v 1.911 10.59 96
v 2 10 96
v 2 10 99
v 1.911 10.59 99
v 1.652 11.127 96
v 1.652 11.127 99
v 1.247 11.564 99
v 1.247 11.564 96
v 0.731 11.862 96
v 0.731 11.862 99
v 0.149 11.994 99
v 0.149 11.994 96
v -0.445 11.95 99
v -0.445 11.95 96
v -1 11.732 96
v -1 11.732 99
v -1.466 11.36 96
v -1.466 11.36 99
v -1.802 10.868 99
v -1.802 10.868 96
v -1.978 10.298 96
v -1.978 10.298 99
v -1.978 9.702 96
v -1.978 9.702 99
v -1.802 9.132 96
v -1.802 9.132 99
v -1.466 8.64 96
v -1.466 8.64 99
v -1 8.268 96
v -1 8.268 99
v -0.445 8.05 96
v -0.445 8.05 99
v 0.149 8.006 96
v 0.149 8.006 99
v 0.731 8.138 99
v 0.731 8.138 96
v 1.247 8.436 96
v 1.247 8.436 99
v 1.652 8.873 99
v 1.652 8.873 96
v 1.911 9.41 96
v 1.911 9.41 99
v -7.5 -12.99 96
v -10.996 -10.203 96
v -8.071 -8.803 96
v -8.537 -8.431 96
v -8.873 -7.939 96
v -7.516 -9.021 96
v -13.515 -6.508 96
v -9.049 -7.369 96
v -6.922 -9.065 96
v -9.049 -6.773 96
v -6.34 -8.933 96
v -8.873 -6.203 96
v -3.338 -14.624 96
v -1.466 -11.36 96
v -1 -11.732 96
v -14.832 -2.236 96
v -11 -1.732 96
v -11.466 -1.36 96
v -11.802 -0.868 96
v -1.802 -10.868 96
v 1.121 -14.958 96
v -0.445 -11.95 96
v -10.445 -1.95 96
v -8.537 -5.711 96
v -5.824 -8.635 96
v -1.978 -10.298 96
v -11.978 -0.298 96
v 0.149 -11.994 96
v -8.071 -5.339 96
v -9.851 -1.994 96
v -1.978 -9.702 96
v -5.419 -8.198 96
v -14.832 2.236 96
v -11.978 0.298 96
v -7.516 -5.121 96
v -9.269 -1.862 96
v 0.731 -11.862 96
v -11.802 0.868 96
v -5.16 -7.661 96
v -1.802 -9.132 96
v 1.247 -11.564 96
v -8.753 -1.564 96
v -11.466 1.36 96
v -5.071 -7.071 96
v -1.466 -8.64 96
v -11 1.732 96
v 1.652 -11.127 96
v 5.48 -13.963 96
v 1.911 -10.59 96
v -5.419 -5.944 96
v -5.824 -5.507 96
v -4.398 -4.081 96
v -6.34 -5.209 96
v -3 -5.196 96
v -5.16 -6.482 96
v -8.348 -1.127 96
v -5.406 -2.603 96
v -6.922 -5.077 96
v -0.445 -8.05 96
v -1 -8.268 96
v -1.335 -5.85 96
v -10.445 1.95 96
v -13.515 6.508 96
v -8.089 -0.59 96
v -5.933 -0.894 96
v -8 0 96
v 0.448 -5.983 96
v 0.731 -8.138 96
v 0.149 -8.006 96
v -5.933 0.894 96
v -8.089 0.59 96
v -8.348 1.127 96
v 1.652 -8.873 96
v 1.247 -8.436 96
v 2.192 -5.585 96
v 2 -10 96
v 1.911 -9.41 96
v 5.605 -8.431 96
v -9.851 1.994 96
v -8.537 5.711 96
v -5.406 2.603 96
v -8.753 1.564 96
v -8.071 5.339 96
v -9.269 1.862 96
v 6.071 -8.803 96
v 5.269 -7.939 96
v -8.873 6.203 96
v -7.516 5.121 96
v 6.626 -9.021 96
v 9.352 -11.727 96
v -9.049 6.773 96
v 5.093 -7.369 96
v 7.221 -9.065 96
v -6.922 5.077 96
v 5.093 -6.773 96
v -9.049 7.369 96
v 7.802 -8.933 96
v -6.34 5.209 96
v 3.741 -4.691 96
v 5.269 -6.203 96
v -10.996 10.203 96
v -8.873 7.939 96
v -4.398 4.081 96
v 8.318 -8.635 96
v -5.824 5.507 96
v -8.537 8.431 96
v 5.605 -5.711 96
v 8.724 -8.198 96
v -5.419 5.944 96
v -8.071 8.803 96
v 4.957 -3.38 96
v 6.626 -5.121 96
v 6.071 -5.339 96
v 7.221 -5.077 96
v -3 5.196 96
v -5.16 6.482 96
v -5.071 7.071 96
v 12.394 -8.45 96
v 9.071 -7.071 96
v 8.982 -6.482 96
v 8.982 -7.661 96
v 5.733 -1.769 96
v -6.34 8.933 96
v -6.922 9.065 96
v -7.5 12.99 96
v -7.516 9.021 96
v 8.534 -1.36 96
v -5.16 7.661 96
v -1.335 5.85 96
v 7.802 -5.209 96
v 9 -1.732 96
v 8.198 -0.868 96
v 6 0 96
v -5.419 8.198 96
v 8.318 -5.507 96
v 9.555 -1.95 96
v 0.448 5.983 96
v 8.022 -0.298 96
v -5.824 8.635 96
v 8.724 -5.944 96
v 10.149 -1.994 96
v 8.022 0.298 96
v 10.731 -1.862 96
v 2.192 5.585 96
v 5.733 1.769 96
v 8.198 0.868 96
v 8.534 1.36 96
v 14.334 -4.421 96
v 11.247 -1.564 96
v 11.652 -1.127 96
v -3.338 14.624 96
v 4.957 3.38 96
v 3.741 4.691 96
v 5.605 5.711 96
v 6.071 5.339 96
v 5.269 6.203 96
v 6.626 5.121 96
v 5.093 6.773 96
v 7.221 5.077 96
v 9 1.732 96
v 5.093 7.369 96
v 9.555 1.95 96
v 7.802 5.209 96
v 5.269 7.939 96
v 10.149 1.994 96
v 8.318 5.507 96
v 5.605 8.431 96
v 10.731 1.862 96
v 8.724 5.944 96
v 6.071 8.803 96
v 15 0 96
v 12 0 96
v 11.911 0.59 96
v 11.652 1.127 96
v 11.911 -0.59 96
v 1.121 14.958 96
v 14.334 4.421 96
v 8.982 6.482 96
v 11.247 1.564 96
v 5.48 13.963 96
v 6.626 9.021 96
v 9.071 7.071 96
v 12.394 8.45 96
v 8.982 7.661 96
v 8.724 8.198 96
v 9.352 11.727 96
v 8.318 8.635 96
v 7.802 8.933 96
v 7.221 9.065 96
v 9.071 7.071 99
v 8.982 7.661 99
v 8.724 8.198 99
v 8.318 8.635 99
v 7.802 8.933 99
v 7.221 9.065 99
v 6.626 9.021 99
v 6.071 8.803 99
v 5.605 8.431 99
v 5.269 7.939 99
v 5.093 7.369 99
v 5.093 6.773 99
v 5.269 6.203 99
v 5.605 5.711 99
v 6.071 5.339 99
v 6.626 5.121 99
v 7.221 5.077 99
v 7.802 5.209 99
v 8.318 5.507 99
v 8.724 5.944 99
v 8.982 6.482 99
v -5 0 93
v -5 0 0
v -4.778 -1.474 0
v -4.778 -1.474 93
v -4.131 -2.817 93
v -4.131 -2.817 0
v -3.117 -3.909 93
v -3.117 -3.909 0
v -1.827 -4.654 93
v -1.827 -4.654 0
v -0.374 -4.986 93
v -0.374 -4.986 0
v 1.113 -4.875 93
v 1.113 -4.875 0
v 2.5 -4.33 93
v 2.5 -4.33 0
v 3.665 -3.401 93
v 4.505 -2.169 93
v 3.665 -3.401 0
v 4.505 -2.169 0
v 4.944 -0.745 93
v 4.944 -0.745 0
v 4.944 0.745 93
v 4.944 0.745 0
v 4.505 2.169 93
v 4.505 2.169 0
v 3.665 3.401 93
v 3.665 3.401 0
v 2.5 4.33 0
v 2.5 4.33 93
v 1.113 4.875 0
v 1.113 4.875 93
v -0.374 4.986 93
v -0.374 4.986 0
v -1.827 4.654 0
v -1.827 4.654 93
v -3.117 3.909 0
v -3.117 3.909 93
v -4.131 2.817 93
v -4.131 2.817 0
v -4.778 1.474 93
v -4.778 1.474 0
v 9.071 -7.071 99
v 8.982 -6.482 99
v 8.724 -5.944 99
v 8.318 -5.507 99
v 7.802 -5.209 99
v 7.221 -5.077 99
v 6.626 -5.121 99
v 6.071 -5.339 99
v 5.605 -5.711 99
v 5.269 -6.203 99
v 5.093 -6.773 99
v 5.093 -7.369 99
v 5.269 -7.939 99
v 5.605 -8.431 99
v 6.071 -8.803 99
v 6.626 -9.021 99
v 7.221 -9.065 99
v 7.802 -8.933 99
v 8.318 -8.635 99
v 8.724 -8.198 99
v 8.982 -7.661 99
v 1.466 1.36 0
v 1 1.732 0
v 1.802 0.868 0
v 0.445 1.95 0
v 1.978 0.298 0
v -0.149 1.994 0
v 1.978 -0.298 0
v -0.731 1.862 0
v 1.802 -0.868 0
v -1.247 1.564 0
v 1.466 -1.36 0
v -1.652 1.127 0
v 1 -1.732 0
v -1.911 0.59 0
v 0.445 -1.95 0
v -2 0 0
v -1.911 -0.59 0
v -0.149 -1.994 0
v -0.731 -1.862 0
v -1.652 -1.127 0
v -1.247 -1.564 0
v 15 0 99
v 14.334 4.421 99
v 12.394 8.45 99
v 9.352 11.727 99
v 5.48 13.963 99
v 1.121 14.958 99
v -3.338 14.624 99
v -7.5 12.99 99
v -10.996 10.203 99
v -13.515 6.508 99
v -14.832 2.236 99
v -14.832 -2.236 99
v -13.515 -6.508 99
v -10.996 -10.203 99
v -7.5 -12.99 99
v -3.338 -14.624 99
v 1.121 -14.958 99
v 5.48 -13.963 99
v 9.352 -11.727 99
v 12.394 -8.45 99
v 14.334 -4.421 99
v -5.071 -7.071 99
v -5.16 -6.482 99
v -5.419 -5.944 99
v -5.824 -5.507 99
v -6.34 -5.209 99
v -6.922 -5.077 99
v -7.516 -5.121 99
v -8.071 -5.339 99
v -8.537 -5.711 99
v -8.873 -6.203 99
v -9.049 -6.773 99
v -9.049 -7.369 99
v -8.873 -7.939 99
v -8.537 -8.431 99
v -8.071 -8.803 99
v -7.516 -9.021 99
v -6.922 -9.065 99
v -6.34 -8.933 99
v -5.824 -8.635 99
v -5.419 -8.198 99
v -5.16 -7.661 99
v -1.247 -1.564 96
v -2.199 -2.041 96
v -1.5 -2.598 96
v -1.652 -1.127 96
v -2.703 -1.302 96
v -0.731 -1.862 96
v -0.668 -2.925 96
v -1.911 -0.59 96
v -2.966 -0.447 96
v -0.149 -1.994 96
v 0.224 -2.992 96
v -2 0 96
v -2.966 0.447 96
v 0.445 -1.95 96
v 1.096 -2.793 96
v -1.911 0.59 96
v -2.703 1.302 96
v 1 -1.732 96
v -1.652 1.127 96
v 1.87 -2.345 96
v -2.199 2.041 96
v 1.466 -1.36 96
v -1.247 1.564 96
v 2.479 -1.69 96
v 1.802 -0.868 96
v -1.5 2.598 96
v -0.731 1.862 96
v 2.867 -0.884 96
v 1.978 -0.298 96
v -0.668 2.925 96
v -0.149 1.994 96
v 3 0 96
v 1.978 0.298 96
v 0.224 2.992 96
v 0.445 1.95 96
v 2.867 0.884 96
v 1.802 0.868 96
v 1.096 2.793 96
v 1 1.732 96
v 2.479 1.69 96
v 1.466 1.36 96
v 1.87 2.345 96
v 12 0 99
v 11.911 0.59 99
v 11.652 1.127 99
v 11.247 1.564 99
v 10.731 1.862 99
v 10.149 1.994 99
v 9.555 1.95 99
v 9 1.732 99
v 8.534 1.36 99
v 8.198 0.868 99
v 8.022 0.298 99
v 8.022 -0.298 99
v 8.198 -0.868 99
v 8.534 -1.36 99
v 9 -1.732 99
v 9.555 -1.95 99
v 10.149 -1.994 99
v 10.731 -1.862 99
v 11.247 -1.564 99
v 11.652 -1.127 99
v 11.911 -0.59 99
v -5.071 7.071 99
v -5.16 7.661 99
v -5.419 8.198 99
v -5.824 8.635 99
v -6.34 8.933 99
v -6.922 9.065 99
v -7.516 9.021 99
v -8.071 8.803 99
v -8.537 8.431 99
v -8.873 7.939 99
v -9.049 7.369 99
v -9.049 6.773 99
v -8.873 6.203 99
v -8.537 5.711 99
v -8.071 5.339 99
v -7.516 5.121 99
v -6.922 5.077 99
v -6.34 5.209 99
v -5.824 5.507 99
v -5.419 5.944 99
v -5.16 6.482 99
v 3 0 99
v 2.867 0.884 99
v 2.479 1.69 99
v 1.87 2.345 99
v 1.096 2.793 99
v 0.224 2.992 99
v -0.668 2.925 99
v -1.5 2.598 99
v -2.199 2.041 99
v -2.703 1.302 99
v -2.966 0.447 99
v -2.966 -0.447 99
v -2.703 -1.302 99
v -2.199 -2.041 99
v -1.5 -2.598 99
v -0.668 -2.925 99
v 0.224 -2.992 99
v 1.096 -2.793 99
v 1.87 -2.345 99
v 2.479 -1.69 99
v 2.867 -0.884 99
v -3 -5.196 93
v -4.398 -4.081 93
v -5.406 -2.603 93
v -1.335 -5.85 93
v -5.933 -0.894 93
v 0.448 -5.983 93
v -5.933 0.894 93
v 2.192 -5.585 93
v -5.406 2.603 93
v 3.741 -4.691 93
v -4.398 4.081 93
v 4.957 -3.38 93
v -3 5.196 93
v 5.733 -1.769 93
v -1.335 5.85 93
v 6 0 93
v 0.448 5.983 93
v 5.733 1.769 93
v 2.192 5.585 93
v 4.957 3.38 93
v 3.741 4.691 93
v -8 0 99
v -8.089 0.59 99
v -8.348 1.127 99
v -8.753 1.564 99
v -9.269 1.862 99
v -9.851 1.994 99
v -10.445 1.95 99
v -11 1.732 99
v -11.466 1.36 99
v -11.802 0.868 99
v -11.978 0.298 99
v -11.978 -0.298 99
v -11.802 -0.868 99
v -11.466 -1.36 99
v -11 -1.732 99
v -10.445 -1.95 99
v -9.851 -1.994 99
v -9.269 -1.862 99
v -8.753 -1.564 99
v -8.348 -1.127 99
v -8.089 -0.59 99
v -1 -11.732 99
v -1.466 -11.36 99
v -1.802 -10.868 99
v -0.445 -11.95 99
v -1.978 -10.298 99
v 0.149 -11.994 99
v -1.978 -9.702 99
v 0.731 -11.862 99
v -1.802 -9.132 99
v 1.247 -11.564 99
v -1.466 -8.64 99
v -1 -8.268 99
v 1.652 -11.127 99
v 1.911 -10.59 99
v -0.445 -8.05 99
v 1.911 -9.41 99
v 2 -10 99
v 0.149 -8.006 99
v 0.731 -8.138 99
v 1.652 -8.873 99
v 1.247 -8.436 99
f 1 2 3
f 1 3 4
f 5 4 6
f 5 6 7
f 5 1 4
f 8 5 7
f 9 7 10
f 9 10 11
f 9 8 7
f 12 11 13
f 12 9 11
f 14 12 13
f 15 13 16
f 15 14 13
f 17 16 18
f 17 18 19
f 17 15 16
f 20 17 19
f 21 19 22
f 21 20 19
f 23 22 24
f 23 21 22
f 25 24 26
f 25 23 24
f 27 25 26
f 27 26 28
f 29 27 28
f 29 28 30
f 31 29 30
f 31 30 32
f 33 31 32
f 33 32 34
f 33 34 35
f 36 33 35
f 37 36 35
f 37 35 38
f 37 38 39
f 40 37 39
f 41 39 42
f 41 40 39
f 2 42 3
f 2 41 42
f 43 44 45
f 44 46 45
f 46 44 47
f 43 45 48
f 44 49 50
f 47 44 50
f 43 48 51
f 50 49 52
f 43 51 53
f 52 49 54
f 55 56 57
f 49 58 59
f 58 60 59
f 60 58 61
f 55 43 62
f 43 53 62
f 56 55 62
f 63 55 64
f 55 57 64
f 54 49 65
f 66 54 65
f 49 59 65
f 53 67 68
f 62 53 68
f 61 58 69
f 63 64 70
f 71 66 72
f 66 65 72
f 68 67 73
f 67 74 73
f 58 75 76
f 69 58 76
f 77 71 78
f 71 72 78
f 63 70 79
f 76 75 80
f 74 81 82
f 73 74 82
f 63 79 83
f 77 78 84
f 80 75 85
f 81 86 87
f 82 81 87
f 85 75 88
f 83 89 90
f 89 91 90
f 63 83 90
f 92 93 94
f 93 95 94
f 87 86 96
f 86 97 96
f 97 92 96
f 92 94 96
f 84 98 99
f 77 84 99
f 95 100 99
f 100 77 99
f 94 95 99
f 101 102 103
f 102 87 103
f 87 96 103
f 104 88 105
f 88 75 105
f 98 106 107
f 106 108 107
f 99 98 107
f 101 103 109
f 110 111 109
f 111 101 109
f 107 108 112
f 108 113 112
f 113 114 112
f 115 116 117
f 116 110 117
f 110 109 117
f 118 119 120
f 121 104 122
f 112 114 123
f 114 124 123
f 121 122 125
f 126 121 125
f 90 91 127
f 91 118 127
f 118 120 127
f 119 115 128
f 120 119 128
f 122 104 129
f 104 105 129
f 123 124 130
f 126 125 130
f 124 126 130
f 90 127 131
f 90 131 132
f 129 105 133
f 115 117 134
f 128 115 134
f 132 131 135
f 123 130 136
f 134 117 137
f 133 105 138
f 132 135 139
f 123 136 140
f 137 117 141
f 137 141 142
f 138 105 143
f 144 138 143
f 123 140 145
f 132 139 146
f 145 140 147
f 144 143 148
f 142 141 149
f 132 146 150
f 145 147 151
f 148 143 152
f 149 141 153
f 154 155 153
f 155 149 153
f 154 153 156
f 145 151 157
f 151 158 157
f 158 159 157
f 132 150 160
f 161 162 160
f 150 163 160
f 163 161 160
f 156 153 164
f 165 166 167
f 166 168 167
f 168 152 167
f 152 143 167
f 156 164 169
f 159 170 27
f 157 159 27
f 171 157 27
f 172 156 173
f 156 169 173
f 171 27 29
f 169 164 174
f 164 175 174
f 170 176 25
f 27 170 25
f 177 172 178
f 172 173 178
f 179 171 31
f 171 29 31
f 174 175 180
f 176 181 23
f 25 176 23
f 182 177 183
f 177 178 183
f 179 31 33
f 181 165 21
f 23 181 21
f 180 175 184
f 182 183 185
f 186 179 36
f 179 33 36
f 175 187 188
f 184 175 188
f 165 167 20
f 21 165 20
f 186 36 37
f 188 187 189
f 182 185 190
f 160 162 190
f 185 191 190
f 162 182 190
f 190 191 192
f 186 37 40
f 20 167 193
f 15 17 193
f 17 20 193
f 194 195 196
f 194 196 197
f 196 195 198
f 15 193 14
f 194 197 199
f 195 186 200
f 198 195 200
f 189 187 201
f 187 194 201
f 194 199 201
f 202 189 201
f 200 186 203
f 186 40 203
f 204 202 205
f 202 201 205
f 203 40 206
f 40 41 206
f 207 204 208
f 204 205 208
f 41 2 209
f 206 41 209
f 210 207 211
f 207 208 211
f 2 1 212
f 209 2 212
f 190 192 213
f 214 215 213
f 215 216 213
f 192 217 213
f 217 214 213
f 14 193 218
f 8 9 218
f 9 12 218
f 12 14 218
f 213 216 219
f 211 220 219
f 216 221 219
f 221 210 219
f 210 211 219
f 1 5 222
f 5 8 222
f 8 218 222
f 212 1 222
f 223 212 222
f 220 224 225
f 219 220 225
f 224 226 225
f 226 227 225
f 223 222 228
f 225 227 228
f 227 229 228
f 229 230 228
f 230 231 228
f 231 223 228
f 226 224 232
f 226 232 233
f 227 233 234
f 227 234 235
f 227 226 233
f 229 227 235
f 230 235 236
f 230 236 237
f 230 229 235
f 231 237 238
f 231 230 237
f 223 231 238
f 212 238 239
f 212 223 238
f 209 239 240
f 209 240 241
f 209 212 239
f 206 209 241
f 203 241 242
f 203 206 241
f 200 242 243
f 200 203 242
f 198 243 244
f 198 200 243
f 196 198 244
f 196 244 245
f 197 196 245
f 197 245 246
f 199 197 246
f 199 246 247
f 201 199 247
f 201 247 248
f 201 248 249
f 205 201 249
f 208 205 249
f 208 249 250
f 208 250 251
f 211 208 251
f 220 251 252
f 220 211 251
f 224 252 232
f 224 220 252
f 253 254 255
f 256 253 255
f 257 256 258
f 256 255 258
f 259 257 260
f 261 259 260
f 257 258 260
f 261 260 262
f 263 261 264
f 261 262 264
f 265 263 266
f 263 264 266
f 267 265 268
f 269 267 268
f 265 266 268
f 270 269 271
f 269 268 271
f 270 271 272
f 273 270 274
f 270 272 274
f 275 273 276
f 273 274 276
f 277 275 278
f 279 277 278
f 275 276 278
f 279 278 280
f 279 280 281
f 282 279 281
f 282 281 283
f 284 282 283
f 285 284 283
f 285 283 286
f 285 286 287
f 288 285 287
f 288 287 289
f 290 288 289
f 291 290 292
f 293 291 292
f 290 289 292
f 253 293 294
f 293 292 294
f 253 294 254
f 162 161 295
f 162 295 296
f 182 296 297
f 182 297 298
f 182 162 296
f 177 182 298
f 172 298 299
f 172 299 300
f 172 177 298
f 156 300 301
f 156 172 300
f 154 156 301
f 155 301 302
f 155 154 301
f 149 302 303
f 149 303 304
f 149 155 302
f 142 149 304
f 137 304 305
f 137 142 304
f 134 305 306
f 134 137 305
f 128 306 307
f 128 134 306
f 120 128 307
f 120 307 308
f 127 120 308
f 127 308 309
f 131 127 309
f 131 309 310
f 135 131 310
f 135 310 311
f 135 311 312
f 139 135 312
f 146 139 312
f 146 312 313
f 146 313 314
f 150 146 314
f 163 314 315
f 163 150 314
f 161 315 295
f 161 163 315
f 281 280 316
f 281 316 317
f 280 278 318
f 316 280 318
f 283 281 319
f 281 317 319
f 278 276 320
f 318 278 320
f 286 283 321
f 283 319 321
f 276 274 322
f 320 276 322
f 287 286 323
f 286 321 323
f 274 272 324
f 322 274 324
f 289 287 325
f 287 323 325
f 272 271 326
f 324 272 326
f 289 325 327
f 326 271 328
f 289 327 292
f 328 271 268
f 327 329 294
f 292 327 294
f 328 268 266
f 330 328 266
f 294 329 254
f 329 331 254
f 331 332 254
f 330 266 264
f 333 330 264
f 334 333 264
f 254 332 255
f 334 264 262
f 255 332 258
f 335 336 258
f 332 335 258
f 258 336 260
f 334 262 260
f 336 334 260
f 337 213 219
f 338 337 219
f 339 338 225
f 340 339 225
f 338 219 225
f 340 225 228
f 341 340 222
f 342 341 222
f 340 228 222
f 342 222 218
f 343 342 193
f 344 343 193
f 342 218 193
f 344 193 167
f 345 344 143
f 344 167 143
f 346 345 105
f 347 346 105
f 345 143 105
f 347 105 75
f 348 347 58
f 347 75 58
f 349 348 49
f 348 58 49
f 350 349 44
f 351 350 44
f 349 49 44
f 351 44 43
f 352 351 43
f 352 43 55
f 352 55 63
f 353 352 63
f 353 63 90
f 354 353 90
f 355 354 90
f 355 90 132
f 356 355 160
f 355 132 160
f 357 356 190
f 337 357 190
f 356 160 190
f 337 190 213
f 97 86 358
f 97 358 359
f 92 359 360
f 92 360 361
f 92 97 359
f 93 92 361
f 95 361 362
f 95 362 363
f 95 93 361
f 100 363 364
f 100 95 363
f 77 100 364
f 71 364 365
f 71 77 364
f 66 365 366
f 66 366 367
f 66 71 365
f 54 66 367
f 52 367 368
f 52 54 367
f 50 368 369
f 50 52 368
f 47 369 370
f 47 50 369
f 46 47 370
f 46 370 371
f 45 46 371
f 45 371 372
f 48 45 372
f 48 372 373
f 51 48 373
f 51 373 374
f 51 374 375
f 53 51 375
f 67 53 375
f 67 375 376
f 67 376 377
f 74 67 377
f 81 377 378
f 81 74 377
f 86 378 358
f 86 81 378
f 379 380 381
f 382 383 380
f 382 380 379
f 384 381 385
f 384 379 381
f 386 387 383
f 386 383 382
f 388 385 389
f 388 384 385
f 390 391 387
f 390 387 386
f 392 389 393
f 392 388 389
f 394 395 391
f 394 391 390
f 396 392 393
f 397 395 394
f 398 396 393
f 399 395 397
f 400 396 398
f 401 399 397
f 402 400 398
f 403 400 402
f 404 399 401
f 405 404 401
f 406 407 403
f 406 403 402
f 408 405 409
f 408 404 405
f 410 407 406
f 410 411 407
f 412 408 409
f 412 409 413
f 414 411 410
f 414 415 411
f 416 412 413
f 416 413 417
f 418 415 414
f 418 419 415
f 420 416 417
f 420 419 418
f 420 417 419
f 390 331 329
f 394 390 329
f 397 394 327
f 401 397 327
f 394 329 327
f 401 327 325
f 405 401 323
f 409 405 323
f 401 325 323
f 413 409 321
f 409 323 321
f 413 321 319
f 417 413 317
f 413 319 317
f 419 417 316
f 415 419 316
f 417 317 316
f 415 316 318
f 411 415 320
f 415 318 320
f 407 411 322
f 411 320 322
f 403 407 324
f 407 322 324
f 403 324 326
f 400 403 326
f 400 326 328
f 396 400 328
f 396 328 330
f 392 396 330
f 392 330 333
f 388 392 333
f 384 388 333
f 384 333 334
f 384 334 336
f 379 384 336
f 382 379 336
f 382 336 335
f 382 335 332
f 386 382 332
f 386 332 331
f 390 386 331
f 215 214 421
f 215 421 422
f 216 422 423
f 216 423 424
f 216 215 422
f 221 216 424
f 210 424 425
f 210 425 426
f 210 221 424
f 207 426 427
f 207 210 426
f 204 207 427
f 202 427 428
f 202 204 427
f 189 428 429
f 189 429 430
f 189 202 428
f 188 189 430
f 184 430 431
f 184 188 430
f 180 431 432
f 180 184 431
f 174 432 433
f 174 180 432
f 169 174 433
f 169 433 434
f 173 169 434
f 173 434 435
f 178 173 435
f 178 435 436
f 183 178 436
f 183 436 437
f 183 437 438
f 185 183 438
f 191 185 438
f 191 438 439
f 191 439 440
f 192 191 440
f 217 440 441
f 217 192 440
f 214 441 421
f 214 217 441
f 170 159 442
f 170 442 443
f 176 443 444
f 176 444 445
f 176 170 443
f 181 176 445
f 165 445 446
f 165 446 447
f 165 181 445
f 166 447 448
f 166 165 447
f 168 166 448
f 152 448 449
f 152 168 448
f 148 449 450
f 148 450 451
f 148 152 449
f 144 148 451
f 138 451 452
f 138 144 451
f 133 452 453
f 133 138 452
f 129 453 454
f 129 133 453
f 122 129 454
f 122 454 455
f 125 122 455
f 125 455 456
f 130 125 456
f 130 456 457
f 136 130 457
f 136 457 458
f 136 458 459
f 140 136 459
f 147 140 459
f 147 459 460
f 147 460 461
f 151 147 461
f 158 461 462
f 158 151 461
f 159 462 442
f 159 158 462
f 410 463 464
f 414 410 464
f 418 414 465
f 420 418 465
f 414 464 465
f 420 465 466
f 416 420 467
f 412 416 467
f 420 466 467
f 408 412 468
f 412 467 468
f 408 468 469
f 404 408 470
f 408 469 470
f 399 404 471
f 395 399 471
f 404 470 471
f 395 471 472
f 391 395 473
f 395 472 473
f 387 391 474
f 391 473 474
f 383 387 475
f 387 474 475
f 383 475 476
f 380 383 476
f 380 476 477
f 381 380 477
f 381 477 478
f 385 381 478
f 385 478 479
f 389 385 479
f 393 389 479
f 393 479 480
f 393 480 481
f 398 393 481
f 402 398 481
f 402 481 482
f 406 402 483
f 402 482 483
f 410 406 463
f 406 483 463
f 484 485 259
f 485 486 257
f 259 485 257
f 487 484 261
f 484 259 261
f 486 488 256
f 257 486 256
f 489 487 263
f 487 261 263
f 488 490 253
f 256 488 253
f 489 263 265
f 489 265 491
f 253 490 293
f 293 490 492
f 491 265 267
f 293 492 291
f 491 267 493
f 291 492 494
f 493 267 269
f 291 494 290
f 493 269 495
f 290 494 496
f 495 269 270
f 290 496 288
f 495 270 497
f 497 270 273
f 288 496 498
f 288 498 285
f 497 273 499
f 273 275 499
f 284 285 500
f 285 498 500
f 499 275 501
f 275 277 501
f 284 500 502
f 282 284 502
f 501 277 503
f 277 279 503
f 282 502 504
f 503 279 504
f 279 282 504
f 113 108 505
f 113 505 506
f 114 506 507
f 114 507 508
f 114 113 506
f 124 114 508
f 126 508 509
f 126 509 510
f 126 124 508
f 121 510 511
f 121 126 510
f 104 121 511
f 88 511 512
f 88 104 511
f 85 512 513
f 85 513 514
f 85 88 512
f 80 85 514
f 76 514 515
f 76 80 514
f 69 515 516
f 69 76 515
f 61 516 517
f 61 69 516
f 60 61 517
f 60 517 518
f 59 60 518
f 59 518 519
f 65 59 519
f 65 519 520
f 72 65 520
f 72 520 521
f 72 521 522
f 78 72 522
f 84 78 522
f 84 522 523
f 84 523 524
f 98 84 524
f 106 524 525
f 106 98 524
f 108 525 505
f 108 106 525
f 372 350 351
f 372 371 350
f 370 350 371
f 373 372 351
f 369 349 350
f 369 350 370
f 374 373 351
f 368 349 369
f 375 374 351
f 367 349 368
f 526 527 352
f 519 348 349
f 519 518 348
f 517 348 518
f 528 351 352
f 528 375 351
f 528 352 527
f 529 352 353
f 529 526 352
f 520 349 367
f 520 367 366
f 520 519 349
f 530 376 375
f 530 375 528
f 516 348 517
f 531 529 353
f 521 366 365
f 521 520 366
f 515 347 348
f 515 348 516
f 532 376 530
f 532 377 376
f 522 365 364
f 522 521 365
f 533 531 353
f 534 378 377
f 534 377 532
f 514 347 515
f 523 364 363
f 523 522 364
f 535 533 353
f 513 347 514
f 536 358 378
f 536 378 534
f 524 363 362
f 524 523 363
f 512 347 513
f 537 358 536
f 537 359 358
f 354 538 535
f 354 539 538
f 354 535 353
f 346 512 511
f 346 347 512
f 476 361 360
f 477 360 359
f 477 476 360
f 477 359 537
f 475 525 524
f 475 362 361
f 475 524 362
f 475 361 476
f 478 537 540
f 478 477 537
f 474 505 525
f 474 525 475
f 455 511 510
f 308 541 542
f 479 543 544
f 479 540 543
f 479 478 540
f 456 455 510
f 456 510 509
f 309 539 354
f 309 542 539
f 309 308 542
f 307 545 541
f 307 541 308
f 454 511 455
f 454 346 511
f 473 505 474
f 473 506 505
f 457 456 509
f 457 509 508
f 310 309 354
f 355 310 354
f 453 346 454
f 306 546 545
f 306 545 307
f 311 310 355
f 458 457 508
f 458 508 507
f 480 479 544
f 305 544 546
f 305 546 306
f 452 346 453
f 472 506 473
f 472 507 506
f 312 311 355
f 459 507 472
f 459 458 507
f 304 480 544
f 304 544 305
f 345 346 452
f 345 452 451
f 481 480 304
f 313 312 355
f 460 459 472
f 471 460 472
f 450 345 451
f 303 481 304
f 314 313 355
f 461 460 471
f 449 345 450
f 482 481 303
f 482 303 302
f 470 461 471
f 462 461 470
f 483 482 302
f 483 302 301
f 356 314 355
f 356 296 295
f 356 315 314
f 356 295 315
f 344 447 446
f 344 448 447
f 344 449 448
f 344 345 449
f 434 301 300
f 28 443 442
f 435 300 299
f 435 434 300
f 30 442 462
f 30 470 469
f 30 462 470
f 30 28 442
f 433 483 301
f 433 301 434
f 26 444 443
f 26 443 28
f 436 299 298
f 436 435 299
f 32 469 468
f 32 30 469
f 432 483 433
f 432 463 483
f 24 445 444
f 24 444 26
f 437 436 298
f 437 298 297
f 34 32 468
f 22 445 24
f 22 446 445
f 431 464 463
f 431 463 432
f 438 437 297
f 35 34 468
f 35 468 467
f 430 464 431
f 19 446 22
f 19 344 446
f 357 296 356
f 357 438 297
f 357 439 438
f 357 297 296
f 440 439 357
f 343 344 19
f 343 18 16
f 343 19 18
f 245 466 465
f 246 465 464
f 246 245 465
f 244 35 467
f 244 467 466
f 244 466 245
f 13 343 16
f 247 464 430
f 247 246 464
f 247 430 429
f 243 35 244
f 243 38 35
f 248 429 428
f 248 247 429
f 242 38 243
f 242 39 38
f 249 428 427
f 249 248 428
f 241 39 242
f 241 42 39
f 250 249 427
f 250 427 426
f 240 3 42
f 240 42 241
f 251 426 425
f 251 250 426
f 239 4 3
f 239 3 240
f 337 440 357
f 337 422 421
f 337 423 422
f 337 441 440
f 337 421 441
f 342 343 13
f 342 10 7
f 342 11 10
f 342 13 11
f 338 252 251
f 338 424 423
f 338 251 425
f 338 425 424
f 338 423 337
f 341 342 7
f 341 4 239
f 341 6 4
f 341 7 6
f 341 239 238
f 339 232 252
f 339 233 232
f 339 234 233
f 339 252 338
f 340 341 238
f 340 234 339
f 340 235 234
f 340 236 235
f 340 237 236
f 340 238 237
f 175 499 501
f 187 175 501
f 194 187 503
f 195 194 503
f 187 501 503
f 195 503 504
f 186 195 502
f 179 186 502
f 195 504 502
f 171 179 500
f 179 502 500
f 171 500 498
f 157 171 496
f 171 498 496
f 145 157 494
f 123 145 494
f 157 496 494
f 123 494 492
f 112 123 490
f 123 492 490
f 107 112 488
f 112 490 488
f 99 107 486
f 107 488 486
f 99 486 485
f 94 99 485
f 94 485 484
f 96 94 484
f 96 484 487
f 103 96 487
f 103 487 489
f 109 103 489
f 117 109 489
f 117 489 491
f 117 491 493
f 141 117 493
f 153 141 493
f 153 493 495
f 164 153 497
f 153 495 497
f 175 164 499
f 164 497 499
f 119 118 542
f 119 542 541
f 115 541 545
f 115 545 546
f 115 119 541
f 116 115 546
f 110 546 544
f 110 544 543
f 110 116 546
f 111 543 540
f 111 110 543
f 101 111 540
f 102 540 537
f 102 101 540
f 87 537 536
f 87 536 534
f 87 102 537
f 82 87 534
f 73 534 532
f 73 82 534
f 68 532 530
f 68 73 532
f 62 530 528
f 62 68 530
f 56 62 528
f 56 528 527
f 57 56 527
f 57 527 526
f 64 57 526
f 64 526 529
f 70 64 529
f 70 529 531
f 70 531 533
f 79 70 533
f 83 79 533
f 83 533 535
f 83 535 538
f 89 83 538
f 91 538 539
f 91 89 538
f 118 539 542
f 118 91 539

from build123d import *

# Parameters (mm, degrees)
SKETCH_1_R          = 5
EXTRUDE_1_DEPTH     = 93
SKETCH_2_R          = 6
EXTRUDE_2_DEPTH     = 3
SKETCH_3_R          = 15
SKETCH_3_R_2        = 2
EXTRUDE_3_DEPTH     = 3
SKETCH_6_R          = 2
CUT_EXTRUDE_3_DEPTH = 102.247222184
SKETCH_7_R          = 3
CUT_EXTRUDE_4_DEPTH = 3


with BuildPart() as part:
    # 草图1 → 凸台-拉伸1 (new body)
    with BuildSketch(Plane.XY):
        with Locations(Location((0, 0, 0), (0, 0, 180))):
            Circle(SKETCH_1_R)
    extrude(amount=EXTRUDE_1_DEPTH)

    # 草图2 → 凸台-拉伸2 (add)
    with BuildSketch(Plane.XY.offset(93)):
        Circle(SKETCH_2_R)
    extrude(amount=EXTRUDE_2_DEPTH)

    # 草图3 → 凸台-拉伸3 (add)
    with BuildSketch(Plane.XY.offset(96)):
        Circle(SKETCH_3_R)
        with Locations((0, 10)):
            Circle(SKETCH_3_R_2, mode=Mode.SUBTRACT)
        with Locations((10, 0)):
            Circle(SKETCH_3_R_2, mode=Mode.SUBTRACT)
        with Locations((0, -10)):
            Circle(SKETCH_3_R_2, mode=Mode.SUBTRACT)
        with Locations((-10, 0)):
            Circle(SKETCH_3_R_2, mode=Mode.SUBTRACT)
        with Locations((7.071067812, 7.071067812)):
            Circle(SKETCH_3_R_2, mode=Mode.SUBTRACT)
        with Locations((7.071067812, -7.071067812)):
            Circle(SKETCH_3_R_2, mode=Mode.SUBTRACT)
        with Locations((-7.071067812, -7.071067812)):
            Circle(SKETCH_3_R_2, mode=Mode.SUBTRACT)
        with Locations((-7.071067812, 7.071067812)):
            Circle(SKETCH_3_R_2, mode=Mode.SUBTRACT)
    extrude(amount=EXTRUDE_3_DEPTH)

    # 草图6 → 切除-拉伸3 (cut, through all)
    with BuildSketch(Plane(origin=(0, 0, 0), x_dir=(-1, 0, 0), z_dir=(0, 0, -1))):
        Circle(SKETCH_6_R)
    extrude(amount=-CUT_EXTRUDE_3_DEPTH, mode=Mode.SUBTRACT)

    # 草图7 → 切除-拉伸4 (cut)
    with BuildSketch(Plane.XY.offset(99)):
        Circle(SKETCH_7_R)
    extrude(amount=-CUT_EXTRUDE_4_DEPTH, mode=Mode.SUBTRACT)


solid = part.part
